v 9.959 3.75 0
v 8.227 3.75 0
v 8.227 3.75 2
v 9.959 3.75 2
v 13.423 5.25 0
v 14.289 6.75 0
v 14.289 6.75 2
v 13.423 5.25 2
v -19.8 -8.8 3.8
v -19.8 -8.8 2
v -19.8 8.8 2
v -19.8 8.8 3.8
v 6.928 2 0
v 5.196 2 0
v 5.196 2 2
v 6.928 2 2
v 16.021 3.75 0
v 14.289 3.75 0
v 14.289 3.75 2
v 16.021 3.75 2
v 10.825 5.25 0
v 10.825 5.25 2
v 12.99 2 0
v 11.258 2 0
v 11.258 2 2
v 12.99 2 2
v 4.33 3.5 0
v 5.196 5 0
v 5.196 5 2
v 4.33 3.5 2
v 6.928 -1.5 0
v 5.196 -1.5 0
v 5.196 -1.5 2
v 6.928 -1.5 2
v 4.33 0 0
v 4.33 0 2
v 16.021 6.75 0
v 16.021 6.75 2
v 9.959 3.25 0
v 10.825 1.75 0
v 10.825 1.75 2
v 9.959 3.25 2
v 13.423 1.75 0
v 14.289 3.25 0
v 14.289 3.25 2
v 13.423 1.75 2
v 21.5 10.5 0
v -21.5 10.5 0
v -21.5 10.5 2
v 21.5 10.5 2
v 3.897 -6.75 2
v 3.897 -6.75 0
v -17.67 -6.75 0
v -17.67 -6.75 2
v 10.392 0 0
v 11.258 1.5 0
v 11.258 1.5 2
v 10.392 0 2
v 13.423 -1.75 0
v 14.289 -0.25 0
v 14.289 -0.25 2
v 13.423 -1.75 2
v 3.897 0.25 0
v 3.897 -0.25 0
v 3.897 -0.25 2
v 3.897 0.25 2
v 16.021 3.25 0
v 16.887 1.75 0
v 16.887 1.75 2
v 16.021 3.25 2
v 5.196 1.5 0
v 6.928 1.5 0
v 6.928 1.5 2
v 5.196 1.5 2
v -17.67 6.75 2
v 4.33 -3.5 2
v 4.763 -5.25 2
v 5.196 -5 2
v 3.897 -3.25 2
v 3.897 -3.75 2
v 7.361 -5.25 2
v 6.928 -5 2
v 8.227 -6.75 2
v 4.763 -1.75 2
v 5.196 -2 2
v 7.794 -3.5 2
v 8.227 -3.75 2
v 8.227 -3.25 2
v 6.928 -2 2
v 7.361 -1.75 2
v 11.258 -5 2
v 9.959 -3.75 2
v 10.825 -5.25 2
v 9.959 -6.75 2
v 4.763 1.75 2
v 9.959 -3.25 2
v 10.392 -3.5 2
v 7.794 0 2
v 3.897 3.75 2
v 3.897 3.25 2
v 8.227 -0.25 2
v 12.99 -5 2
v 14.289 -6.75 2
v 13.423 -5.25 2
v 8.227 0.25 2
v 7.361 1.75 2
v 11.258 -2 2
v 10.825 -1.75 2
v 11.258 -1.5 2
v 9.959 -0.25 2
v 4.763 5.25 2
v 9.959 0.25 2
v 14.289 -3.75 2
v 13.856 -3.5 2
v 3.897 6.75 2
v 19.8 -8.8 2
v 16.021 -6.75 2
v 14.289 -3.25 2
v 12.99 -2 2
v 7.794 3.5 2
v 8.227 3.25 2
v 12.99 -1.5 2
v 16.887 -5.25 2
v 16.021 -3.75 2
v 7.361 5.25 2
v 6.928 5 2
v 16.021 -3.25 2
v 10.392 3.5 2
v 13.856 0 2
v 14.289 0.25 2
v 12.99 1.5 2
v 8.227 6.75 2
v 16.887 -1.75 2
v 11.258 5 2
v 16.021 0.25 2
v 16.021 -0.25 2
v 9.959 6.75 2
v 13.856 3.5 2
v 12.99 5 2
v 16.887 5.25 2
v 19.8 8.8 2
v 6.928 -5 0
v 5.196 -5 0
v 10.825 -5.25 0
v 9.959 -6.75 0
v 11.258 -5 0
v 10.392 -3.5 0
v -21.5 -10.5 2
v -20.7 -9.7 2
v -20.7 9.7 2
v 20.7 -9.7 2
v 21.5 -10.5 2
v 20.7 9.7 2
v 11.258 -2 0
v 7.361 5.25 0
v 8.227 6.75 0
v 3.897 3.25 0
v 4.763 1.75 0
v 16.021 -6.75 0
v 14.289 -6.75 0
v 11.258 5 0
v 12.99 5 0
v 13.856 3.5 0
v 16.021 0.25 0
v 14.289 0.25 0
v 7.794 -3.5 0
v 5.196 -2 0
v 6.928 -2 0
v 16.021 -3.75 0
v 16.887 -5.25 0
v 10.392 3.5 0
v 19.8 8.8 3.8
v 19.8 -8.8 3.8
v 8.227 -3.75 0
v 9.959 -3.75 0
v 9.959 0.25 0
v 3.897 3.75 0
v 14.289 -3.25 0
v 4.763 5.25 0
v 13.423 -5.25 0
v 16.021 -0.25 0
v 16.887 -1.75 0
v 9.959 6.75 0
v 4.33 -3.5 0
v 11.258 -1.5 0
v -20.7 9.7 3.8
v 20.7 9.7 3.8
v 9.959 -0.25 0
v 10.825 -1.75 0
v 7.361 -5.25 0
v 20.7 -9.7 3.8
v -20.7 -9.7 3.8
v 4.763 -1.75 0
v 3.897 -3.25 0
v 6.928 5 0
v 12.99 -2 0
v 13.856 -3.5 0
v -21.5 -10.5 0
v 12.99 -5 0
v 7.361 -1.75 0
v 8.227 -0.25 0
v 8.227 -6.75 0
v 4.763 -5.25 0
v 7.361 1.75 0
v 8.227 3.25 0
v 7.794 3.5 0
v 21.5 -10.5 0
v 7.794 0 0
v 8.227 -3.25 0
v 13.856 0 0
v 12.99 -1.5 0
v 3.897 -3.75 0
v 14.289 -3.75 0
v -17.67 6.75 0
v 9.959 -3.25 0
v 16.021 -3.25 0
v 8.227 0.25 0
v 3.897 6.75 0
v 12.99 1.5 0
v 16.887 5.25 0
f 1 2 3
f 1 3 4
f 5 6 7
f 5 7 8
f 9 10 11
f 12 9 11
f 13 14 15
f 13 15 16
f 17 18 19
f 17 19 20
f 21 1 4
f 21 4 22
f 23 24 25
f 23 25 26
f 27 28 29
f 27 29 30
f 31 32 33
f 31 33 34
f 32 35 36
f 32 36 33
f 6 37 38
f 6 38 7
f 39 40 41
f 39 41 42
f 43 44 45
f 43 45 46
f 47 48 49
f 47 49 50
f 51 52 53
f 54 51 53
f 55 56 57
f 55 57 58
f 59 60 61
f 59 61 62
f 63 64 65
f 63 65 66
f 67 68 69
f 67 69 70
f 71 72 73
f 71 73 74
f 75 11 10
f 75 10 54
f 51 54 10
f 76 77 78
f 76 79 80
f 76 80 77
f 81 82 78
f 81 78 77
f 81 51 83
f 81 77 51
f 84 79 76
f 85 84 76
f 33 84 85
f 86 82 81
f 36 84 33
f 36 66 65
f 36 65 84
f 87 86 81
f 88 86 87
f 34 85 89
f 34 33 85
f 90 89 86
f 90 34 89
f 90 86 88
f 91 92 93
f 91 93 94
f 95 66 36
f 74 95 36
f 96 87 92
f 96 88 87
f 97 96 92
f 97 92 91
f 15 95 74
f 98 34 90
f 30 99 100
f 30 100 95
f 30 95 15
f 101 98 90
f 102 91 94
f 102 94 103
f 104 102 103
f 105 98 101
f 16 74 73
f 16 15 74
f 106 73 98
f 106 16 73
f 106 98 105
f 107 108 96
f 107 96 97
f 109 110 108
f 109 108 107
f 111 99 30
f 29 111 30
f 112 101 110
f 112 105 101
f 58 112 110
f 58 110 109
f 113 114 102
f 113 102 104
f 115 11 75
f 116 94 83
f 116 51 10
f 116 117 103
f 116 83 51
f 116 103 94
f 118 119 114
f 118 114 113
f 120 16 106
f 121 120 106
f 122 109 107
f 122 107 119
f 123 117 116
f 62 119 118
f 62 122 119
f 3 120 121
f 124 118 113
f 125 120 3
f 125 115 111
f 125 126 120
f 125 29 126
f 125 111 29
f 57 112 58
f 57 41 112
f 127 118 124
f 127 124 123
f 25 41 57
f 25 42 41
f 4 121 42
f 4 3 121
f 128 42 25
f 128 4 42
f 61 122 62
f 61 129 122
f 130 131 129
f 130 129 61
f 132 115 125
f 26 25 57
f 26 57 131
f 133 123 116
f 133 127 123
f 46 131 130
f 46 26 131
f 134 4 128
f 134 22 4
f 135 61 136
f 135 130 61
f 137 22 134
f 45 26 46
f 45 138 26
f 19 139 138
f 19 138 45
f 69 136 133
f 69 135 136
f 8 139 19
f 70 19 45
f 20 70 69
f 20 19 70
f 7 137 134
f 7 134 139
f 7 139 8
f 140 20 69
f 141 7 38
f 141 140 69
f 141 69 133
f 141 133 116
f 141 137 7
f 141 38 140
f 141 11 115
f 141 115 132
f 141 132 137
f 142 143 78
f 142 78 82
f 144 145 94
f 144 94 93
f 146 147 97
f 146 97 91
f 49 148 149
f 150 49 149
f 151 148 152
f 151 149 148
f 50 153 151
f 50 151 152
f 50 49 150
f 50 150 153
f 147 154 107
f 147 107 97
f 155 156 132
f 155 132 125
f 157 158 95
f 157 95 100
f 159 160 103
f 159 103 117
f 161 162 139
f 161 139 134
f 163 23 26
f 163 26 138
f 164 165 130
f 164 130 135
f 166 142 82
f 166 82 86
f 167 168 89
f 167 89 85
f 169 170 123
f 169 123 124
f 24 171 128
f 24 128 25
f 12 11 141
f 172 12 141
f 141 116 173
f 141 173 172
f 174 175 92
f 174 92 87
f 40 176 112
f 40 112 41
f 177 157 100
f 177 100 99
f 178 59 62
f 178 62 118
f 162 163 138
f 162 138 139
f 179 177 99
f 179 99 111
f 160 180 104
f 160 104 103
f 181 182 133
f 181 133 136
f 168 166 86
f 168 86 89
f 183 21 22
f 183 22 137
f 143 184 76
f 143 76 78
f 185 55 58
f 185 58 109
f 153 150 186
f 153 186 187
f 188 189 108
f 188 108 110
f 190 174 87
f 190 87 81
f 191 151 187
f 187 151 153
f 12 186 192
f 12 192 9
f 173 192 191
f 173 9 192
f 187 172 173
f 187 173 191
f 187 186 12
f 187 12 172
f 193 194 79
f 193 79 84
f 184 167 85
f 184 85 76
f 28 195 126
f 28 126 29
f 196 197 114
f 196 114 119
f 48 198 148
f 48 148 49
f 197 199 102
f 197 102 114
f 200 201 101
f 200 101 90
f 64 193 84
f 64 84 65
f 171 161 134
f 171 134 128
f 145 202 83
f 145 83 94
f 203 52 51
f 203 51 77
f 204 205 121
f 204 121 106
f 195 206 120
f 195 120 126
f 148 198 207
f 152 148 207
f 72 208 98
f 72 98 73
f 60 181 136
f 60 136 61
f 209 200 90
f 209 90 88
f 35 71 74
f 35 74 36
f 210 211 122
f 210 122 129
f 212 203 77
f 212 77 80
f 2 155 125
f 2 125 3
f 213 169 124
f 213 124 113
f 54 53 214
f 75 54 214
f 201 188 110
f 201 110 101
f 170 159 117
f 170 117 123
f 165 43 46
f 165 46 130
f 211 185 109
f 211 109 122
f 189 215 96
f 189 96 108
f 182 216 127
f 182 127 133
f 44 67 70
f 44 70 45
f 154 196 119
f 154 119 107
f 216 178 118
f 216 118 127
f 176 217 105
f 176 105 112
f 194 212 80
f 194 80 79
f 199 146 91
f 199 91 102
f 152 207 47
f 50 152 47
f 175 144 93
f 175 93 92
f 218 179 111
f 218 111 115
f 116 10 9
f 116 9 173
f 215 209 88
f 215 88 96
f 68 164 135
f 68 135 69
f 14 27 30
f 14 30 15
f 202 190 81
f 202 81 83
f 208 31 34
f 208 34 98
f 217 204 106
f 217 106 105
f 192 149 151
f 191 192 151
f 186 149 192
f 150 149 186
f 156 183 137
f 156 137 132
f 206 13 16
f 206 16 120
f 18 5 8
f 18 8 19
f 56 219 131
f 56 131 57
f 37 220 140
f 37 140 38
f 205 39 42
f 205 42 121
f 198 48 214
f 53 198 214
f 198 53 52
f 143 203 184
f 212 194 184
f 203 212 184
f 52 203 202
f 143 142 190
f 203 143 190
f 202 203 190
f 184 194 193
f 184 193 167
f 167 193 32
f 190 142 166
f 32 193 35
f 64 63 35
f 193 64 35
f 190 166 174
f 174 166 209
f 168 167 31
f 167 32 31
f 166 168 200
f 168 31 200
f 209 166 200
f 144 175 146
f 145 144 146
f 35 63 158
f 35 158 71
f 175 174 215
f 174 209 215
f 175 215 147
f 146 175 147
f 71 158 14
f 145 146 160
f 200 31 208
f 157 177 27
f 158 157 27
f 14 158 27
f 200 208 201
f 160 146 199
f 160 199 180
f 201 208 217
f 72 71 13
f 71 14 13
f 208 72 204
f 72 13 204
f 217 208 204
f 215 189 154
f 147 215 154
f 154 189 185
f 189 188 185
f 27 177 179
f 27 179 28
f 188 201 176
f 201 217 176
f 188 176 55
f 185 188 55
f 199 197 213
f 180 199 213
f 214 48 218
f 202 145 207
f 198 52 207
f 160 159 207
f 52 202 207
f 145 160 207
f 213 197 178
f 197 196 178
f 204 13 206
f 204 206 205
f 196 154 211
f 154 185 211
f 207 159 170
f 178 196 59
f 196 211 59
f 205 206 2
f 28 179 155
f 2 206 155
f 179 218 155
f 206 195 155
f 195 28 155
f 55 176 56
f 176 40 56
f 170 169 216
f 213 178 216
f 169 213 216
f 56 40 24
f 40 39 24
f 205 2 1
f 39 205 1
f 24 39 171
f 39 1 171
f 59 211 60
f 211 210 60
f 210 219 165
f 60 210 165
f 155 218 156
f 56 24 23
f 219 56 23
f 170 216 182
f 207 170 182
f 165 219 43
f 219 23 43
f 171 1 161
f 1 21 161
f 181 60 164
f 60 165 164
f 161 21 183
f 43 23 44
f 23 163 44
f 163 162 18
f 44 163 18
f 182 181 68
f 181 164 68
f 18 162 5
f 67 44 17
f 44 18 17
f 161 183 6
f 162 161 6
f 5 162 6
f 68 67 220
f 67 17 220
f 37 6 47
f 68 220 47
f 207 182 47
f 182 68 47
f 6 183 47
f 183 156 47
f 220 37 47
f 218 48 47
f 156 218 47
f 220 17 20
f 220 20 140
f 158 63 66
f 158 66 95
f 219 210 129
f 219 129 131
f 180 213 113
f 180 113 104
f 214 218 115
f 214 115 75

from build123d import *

# Parameters (mm, degrees)
SKETCH1_W           = 43
SKETCH1_H           = 21
BOSS_EXTRUDE1_DEPTH = 2
SKETCH2_W           = 41.4
SKETCH2_H           = 19.4
SKETCH2_W_2         = 39.6
SKETCH2_H_2         = 17.6
BOSS_EXTRUDE2_DEPTH = 1.8
CUT_EXTRUDE1_DEPTH  = 25.010414407
FILL_PATTERN1_DEPTH = 2
SKETCH4_W           = 21.566848352
SKETCH4_H           = 13.5
CUT_EXTRUDE4_DEPTH  = 25.226844615


# Read off the part's stored shape, not the designer's step: Fill Pattern1
with BuildPart() as part:
    # Sketch1 → Boss-Extrude1 (new body)
    with BuildSketch(Plane.XY):
        Rectangle(SKETCH1_W, SKETCH1_H)
    extrude(amount=BOSS_EXTRUDE1_DEPTH)

    # Sketch2 → Boss-Extrude2 (add)
    with BuildSketch(Plane.XY.offset(2)):
        Rectangle(SKETCH2_W, SKETCH2_H)
        Rectangle(SKETCH2_W_2, SKETCH2_H_2, mode=Mode.SUBTRACT)
    extrude(amount=BOSS_EXTRUDE2_DEPTH)

    # Sketch3 → Cut-Extrude1 (cut, through all)
    with BuildSketch(Plane.XY.offset(2)):
        Polygon((-0.866025404, 1.5), (-1.732050808, 0), (-0.866025404, -1.5), (0.866025404, -1.5), (1.732050808, 0), (0.866025404, 1.5), align=None)
    extrude(amount=-CUT_EXTRUDE1_DEPTH, mode=Mode.SUBTRACT)

    # Fill Pattern1 outline → Fill Pattern1 (cut)
    with BuildSketch(Plane.XY):
        Polygon((7.794228634, 0), (6.92820323, 1.5), (5.196152423, 1.5), (4.330127019, 0), (5.196152423, -1.5), (6.92820323, -1.5), align=None)
        Polygon((13.856406461, 0), (12.990381057, 1.5), (11.258330249, 1.5), (10.392304845, 0), (11.258330249, -1.5), (12.990381057, -1.5), align=None)
        Polygon((-4.330127019, 0), (-5.196152423, 1.5), (-6.92820323, 1.5), (-7.794228634, 0), (-6.92820323, -1.5), (-5.196152423, -1.5), align=None)
        Polygon((-10.392304845, 0), (-11.258330249, 1.5), (-12.990381057, 1.5), (-13.856406461, 0), (-12.990381057, -1.5), (-11.258330249, -1.5), align=None)
        Polygon((-2.165063509, 3.75), (-1.299038106, 5.25), (-2.165063509, 6.75), (-3.897114317, 6.75), (-4.763139721, 5.25), (-3.897114317, 3.75), align=None)
        Polygon((3.897114317, -6.75), (4.763139721, -5.25), (3.897114317, -3.75), (2.165063509, -3.75), (1.299038106, -5.25), (2.165063509, -6.75), align=None)
        Polygon((-3.897114317, -6.75), (-2.165063509, -6.75), (-1.299038106, -5.25), (-2.165063509, -3.75), (-3.897114317, -3.75), (-4.763139721, -5.25), align=None)
        Polygon((2.165063509, 3.75), (3.897114317, 3.75), (4.763139721, 5.25), (3.897114317, 6.75), (2.165063509, 6.75), (1.299038106, 5.25), align=None)
        Polygon((16.887495374, -5.25), (16.02146997, -3.75), (14.289419162, -3.75), (13.423393759, -5.25), (14.289419162, -6.75), (16.02146997, -6.75), align=None)
        Polygon((-7.361215932, -5.25), (-8.227241336, -3.75), (-9.959292144, -3.75), (-10.825317547, -5.25), (-9.959292144, -6.75), (-8.227241336, -6.75), align=None)
        Polygon((10.825317547, -5.25), (9.959292144, -3.75), (8.227241336, -3.75), (7.361215932, -5.25), (8.227241336, -6.75), (9.959292144, -6.75), align=None)
        Polygon((-13.423393759, -5.25), (-14.289419162, -3.75), (-16.02146997, -3.75), (-16.887495374, -5.25), (-16.02146997, -6.75), (-14.289419162, -6.75), align=None)
        Polygon((9.959292144, 3.75), (10.825317547, 5.25), (9.959292144, 6.75), (8.227241336, 6.75), (7.361215932, 5.25), (8.227241336, 3.75), align=None)
        Polygon((-10.392304845, 3.5), (-11.258330249, 5), (-12.990381057, 5), (-13.856406461, 3.5), (-12.990381057, 2), (-11.258330249, 2), align=None)
        Polygon((13.856406461, 3.5), (12.990381057, 5), (11.258330249, 5), (10.392304845, 3.5), (11.258330249, 2), (12.990381057, 2), align=None)
        Polygon((1.732050808, 3.5), (0.866025404, 5), (-0.866025404, 5), (-1.732050808, 3.5), (-0.866025404, 2), (0.866025404, 2), align=None)
        Polygon((-4.330127019, 3.5), (-5.196152423, 5), (-6.92820323, 5), (-7.794228634, 3.5), (-6.92820323, 2), (-5.196152423, 2), align=None)
        Polygon((7.794228634, 3.5), (6.92820323, 5), (5.196152423, 5), (4.330127019, 3.5), (5.196152423, 2), (6.92820323, 2), align=None)
        Polygon((-8.227241336, -3.25), (-7.361215932, -1.75), (-8.227241336, -0.25), (-9.959292144, -0.25), (-10.825317547, -1.75), (-9.959292144, -3.25), align=None)
        Polygon((-16.02146997, -3.25), (-14.289419162, -3.25), (-13.423393759, -1.75), (-14.289419162, -0.25), (-16.02146997, -0.25), (-16.887495374, -1.75), align=None)
        Polygon((-7.361215932, 5.25), (-8.227241336, 6.75), (-9.959292144, 6.75), (-10.825317547, 5.25), (-9.959292144, 3.75), (-8.227241336, 3.75), align=None)
        Polygon((-13.423393759, 5.25), (-14.289419162, 6.75), (-16.02146997, 6.75), (-16.887495374, 5.25), (-16.02146997, 3.75), (-14.289419162, 3.75), align=None)
        Polygon((16.887495374, 5.25), (16.02146997, 6.75), (14.289419162, 6.75), (13.423393759, 5.25), (14.289419162, 3.75), (16.02146997, 3.75), align=None)
        Polygon((-13.423393759, 1.75), (-14.289419162, 3.25), (-16.02146997, 3.25), (-16.887495374, 1.75), (-16.02146997, 0.25), (-14.289419162, 0.25), align=None)
        Polygon((10.825317547, 1.75), (9.959292144, 3.25), (8.227241336, 3.25), (7.361215932, 1.75), (8.227241336, 0.25), (9.959292144, 0.25), align=None)
        Polygon((16.887495374, 1.75), (16.02146997, 3.25), (14.289419162, 3.25), (13.423393759, 1.75), (14.289419162, 0.25), (16.02146997, 0.25), align=None)
        Polygon((-1.299038106, 1.75), (-2.165063509, 3.25), (-3.897114317, 3.25), (-4.763139721, 1.75), (-3.897114317, 0.25), (-2.165063509, 0.25), align=None)
        Polygon((-7.361215932, 1.75), (-8.227241336, 3.25), (-9.959292144, 3.25), (-10.825317547, 1.75), (-9.959292144, 0.25), (-8.227241336, 0.25), align=None)
        Polygon((4.763139721, 1.75), (3.897114317, 3.25), (2.165063509, 3.25), (1.299038106, 1.75), (2.165063509, 0.25), (3.897114317, 0.25), align=None)
        Polygon((-11.258330249, -5), (-10.392304845, -3.5), (-11.258330249, -2), (-12.990381057, -2), (-13.856406461, -3.5), (-12.990381057, -5), align=None)
        Polygon((4.763139721, -1.75), (3.897114317, -0.25), (2.165063509, -0.25), (1.299038106, -1.75), (2.165063509, -3.25), (3.897114317, -3.25), align=None)
        Polygon((16.887495374, -1.75), (16.02146997, -0.25), (14.289419162, -0.25), (13.423393759, -1.75), (14.289419162, -3.25), (16.02146997, -3.25), align=None)
        Polygon((10.825317547, -1.75), (9.959292144, -0.25), (8.227241336, -0.25), (7.361215932, -1.75), (8.227241336, -3.25), (9.959292144, -3.25), align=None)
        Polygon((-1.299038106, -1.75), (-2.165063509, -0.25), (-3.897114317, -0.25), (-4.763139721, -1.75), (-3.897114317, -3.25), (-2.165063509, -3.25), align=None)
        Polygon((1.732050808, -3.5), (0.866025404, -2), (-0.866025404, -2), (-1.732050808, -3.5), (-0.866025404, -5), (0.866025404, -5), align=None)
        Polygon((13.856406461, -3.5), (12.990381057, -2), (11.258330249, -2), (10.392304845, -3.5), (11.258330249, -5), (12.990381057, -5), align=None)
        Polygon((7.794228634, -3.5), (6.92820323, -2), (5.196152423, -2), (4.330127019, -3.5), (5.196152423, -5), (6.92820323, -5), align=None)
        Polygon((-4.330127019, -3.5), (-5.196152423, -2), (-6.92820323, -2), (-7.794228634, -3.5), (-6.92820323, -5), (-5.196152423, -5), align=None)
    extrude(amount=FILL_PATTERN1_DEPTH, mode=Mode.SUBTRACT)

    # Sketch4 → Cut-Extrude4 (cut, through all)
    with BuildSketch(Plane(origin=(0, 0, 0), x_dir=(-1, 0, 0), z_dir=(0, 0, -1))):
        with Locations((6.886309859, 0)):
            Rectangle(SKETCH4_W, SKETCH4_H)
    extrude(amount=-CUT_EXTRUDE4_DEPTH, mode=Mode.SUBTRACT)


solid = part.part
